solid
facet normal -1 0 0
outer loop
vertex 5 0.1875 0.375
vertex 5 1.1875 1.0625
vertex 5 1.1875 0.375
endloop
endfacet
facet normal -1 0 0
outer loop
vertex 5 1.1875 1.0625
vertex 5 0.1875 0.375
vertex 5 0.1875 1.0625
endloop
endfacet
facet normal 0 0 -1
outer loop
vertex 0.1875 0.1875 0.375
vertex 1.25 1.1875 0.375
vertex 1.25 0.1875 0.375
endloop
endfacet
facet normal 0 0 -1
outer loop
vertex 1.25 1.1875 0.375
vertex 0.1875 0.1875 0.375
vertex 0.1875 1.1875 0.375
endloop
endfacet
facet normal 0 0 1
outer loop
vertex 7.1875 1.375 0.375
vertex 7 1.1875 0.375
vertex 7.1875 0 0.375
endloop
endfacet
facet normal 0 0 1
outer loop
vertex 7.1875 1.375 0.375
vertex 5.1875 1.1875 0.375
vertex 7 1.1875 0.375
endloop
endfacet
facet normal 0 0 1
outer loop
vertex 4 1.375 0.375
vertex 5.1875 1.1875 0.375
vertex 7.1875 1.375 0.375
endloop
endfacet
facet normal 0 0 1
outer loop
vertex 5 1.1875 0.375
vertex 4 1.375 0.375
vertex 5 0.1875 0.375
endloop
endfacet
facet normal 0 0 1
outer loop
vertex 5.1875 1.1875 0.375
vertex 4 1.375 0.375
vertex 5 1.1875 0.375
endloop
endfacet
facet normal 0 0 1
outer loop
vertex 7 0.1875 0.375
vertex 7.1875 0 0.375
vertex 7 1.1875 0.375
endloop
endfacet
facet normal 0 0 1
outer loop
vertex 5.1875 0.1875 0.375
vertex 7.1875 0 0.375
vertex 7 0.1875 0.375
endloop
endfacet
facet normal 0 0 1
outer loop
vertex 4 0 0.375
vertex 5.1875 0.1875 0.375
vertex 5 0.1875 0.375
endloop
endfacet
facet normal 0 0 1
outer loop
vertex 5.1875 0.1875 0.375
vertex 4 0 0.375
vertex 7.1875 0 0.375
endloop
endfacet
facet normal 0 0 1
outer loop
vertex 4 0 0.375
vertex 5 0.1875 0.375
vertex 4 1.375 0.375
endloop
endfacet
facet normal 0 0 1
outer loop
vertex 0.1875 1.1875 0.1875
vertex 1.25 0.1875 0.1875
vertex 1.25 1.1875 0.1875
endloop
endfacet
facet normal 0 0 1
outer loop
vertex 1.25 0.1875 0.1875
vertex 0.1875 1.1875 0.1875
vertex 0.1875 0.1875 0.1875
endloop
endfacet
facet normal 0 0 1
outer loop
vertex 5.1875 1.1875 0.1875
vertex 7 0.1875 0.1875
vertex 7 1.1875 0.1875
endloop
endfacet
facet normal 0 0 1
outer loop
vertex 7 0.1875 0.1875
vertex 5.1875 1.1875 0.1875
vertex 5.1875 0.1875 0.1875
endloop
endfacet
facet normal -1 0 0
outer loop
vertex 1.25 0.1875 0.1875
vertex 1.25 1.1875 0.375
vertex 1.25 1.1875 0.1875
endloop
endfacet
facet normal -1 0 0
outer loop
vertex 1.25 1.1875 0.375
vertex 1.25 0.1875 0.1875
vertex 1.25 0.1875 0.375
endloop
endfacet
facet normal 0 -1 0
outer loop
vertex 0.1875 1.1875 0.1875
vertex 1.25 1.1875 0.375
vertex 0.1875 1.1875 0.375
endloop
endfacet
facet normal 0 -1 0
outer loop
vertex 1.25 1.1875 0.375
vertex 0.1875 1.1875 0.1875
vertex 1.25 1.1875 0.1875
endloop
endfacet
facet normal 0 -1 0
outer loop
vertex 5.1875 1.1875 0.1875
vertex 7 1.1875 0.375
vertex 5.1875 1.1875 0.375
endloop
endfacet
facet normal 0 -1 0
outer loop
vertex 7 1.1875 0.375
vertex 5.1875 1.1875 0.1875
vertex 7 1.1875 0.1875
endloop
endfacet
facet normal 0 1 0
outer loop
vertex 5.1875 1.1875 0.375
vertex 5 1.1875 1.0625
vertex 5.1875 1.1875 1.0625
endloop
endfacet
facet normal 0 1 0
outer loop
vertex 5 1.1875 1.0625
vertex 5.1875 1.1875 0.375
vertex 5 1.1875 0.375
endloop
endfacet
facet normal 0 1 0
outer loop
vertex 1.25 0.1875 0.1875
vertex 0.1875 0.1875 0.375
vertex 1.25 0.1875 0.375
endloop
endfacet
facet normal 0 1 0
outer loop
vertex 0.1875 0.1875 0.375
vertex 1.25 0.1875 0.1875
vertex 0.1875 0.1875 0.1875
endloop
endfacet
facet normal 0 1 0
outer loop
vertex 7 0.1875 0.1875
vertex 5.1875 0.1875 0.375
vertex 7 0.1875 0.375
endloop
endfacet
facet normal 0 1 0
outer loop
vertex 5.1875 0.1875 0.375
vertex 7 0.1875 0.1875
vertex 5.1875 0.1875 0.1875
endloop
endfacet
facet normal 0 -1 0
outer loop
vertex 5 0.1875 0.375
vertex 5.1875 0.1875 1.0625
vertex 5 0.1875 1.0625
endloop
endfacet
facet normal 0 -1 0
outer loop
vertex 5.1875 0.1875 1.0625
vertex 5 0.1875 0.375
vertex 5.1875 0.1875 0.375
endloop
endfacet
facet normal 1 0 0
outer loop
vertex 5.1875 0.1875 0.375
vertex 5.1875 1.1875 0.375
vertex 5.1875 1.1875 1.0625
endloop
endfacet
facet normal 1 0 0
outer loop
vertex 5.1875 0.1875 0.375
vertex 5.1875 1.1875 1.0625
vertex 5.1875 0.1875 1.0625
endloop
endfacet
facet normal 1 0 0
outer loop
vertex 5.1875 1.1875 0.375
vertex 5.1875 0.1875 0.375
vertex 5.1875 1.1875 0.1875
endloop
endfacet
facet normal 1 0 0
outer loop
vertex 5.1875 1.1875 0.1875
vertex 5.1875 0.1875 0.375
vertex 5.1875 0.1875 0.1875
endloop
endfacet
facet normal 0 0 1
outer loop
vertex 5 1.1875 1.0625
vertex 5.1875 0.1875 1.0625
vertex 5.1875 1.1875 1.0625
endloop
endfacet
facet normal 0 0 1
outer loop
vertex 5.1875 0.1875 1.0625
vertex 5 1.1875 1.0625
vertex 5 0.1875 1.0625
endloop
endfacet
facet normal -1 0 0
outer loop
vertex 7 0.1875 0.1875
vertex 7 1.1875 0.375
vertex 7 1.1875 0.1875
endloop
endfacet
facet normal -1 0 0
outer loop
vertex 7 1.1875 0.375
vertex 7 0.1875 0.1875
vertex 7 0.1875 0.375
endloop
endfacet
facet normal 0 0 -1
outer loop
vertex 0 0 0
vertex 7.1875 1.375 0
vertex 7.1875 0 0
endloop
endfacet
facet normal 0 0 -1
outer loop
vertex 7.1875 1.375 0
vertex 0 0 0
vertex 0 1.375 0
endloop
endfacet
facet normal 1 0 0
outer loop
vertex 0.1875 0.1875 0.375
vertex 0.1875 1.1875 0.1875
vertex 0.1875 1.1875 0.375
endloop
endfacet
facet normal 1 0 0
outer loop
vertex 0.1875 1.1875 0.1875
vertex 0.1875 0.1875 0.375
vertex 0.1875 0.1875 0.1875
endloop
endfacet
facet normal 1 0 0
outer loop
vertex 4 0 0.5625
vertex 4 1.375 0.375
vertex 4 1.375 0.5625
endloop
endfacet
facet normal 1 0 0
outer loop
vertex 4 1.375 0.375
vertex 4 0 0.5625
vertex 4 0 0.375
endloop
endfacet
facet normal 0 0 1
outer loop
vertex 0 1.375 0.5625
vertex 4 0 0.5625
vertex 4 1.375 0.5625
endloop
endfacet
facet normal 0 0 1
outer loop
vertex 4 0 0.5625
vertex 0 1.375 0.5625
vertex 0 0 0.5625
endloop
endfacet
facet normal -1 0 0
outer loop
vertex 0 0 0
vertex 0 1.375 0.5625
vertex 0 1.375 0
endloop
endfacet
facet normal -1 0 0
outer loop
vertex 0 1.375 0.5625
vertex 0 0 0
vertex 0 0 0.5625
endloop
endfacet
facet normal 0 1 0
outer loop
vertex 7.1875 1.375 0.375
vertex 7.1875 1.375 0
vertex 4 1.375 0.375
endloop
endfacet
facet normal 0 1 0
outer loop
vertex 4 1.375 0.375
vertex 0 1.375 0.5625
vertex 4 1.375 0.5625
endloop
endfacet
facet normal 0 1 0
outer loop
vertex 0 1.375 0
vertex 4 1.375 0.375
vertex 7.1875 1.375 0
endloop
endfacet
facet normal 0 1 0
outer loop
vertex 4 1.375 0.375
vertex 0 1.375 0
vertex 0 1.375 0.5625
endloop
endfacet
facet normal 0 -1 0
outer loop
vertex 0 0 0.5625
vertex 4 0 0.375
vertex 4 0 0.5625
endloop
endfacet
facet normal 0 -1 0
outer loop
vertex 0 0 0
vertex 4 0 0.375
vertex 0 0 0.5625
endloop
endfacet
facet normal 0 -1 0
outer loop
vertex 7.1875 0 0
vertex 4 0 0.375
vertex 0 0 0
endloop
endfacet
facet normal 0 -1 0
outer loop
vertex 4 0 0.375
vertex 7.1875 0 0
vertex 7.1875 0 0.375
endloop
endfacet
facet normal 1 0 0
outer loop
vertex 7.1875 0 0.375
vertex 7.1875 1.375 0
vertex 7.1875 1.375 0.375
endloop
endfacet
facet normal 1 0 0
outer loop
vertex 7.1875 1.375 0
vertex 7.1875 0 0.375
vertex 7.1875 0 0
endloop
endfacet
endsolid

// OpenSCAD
module dish_sign(mat_width, disp_length=7, disp_height=1){
    //Base
    translate([mat_width, mat_width, 0]) cube([disp_length - mat_width, 1, mat_width]); //Back
    translate([0, 0, mat_width * 2]) cube([(4.0/7.0) * disp_length, disp_height + 2 * mat_width, mat_width]); //Front
    cube([mat_width, disp_height + 2 * mat_width, 2 * mat_width]); //Left
    translate([disp_length, 0, 0]) cube([mat_width, disp_height + 2 * mat_width, 2 * mat_width]); //Right
    translate([mat_width, disp_height + mat_width, 0]) cube([disp_length - mat_width, mat_width, 2 * mat_width]); //Top
    translate([mat_width, 0, 0]) cube([disp_length - mat_width, mat_width, 2 * mat_width]); //Bottom

    //Slider
    translate([1.25, mat_width, mat_width]) color([1,0,0]) union(){
        cube([(4.0/7.0) * disp_length - (.25/7.0) * disp_length, disp_height, mat_width]); //Base
        translate([(4.0/7.0) * disp_length - (.25/7.0) * disp_length, 0, 0]) cube([mat_width, disp_height, (14.0/3.0) * mat_width]); //End
    }
}

dish_sign(.1875);
